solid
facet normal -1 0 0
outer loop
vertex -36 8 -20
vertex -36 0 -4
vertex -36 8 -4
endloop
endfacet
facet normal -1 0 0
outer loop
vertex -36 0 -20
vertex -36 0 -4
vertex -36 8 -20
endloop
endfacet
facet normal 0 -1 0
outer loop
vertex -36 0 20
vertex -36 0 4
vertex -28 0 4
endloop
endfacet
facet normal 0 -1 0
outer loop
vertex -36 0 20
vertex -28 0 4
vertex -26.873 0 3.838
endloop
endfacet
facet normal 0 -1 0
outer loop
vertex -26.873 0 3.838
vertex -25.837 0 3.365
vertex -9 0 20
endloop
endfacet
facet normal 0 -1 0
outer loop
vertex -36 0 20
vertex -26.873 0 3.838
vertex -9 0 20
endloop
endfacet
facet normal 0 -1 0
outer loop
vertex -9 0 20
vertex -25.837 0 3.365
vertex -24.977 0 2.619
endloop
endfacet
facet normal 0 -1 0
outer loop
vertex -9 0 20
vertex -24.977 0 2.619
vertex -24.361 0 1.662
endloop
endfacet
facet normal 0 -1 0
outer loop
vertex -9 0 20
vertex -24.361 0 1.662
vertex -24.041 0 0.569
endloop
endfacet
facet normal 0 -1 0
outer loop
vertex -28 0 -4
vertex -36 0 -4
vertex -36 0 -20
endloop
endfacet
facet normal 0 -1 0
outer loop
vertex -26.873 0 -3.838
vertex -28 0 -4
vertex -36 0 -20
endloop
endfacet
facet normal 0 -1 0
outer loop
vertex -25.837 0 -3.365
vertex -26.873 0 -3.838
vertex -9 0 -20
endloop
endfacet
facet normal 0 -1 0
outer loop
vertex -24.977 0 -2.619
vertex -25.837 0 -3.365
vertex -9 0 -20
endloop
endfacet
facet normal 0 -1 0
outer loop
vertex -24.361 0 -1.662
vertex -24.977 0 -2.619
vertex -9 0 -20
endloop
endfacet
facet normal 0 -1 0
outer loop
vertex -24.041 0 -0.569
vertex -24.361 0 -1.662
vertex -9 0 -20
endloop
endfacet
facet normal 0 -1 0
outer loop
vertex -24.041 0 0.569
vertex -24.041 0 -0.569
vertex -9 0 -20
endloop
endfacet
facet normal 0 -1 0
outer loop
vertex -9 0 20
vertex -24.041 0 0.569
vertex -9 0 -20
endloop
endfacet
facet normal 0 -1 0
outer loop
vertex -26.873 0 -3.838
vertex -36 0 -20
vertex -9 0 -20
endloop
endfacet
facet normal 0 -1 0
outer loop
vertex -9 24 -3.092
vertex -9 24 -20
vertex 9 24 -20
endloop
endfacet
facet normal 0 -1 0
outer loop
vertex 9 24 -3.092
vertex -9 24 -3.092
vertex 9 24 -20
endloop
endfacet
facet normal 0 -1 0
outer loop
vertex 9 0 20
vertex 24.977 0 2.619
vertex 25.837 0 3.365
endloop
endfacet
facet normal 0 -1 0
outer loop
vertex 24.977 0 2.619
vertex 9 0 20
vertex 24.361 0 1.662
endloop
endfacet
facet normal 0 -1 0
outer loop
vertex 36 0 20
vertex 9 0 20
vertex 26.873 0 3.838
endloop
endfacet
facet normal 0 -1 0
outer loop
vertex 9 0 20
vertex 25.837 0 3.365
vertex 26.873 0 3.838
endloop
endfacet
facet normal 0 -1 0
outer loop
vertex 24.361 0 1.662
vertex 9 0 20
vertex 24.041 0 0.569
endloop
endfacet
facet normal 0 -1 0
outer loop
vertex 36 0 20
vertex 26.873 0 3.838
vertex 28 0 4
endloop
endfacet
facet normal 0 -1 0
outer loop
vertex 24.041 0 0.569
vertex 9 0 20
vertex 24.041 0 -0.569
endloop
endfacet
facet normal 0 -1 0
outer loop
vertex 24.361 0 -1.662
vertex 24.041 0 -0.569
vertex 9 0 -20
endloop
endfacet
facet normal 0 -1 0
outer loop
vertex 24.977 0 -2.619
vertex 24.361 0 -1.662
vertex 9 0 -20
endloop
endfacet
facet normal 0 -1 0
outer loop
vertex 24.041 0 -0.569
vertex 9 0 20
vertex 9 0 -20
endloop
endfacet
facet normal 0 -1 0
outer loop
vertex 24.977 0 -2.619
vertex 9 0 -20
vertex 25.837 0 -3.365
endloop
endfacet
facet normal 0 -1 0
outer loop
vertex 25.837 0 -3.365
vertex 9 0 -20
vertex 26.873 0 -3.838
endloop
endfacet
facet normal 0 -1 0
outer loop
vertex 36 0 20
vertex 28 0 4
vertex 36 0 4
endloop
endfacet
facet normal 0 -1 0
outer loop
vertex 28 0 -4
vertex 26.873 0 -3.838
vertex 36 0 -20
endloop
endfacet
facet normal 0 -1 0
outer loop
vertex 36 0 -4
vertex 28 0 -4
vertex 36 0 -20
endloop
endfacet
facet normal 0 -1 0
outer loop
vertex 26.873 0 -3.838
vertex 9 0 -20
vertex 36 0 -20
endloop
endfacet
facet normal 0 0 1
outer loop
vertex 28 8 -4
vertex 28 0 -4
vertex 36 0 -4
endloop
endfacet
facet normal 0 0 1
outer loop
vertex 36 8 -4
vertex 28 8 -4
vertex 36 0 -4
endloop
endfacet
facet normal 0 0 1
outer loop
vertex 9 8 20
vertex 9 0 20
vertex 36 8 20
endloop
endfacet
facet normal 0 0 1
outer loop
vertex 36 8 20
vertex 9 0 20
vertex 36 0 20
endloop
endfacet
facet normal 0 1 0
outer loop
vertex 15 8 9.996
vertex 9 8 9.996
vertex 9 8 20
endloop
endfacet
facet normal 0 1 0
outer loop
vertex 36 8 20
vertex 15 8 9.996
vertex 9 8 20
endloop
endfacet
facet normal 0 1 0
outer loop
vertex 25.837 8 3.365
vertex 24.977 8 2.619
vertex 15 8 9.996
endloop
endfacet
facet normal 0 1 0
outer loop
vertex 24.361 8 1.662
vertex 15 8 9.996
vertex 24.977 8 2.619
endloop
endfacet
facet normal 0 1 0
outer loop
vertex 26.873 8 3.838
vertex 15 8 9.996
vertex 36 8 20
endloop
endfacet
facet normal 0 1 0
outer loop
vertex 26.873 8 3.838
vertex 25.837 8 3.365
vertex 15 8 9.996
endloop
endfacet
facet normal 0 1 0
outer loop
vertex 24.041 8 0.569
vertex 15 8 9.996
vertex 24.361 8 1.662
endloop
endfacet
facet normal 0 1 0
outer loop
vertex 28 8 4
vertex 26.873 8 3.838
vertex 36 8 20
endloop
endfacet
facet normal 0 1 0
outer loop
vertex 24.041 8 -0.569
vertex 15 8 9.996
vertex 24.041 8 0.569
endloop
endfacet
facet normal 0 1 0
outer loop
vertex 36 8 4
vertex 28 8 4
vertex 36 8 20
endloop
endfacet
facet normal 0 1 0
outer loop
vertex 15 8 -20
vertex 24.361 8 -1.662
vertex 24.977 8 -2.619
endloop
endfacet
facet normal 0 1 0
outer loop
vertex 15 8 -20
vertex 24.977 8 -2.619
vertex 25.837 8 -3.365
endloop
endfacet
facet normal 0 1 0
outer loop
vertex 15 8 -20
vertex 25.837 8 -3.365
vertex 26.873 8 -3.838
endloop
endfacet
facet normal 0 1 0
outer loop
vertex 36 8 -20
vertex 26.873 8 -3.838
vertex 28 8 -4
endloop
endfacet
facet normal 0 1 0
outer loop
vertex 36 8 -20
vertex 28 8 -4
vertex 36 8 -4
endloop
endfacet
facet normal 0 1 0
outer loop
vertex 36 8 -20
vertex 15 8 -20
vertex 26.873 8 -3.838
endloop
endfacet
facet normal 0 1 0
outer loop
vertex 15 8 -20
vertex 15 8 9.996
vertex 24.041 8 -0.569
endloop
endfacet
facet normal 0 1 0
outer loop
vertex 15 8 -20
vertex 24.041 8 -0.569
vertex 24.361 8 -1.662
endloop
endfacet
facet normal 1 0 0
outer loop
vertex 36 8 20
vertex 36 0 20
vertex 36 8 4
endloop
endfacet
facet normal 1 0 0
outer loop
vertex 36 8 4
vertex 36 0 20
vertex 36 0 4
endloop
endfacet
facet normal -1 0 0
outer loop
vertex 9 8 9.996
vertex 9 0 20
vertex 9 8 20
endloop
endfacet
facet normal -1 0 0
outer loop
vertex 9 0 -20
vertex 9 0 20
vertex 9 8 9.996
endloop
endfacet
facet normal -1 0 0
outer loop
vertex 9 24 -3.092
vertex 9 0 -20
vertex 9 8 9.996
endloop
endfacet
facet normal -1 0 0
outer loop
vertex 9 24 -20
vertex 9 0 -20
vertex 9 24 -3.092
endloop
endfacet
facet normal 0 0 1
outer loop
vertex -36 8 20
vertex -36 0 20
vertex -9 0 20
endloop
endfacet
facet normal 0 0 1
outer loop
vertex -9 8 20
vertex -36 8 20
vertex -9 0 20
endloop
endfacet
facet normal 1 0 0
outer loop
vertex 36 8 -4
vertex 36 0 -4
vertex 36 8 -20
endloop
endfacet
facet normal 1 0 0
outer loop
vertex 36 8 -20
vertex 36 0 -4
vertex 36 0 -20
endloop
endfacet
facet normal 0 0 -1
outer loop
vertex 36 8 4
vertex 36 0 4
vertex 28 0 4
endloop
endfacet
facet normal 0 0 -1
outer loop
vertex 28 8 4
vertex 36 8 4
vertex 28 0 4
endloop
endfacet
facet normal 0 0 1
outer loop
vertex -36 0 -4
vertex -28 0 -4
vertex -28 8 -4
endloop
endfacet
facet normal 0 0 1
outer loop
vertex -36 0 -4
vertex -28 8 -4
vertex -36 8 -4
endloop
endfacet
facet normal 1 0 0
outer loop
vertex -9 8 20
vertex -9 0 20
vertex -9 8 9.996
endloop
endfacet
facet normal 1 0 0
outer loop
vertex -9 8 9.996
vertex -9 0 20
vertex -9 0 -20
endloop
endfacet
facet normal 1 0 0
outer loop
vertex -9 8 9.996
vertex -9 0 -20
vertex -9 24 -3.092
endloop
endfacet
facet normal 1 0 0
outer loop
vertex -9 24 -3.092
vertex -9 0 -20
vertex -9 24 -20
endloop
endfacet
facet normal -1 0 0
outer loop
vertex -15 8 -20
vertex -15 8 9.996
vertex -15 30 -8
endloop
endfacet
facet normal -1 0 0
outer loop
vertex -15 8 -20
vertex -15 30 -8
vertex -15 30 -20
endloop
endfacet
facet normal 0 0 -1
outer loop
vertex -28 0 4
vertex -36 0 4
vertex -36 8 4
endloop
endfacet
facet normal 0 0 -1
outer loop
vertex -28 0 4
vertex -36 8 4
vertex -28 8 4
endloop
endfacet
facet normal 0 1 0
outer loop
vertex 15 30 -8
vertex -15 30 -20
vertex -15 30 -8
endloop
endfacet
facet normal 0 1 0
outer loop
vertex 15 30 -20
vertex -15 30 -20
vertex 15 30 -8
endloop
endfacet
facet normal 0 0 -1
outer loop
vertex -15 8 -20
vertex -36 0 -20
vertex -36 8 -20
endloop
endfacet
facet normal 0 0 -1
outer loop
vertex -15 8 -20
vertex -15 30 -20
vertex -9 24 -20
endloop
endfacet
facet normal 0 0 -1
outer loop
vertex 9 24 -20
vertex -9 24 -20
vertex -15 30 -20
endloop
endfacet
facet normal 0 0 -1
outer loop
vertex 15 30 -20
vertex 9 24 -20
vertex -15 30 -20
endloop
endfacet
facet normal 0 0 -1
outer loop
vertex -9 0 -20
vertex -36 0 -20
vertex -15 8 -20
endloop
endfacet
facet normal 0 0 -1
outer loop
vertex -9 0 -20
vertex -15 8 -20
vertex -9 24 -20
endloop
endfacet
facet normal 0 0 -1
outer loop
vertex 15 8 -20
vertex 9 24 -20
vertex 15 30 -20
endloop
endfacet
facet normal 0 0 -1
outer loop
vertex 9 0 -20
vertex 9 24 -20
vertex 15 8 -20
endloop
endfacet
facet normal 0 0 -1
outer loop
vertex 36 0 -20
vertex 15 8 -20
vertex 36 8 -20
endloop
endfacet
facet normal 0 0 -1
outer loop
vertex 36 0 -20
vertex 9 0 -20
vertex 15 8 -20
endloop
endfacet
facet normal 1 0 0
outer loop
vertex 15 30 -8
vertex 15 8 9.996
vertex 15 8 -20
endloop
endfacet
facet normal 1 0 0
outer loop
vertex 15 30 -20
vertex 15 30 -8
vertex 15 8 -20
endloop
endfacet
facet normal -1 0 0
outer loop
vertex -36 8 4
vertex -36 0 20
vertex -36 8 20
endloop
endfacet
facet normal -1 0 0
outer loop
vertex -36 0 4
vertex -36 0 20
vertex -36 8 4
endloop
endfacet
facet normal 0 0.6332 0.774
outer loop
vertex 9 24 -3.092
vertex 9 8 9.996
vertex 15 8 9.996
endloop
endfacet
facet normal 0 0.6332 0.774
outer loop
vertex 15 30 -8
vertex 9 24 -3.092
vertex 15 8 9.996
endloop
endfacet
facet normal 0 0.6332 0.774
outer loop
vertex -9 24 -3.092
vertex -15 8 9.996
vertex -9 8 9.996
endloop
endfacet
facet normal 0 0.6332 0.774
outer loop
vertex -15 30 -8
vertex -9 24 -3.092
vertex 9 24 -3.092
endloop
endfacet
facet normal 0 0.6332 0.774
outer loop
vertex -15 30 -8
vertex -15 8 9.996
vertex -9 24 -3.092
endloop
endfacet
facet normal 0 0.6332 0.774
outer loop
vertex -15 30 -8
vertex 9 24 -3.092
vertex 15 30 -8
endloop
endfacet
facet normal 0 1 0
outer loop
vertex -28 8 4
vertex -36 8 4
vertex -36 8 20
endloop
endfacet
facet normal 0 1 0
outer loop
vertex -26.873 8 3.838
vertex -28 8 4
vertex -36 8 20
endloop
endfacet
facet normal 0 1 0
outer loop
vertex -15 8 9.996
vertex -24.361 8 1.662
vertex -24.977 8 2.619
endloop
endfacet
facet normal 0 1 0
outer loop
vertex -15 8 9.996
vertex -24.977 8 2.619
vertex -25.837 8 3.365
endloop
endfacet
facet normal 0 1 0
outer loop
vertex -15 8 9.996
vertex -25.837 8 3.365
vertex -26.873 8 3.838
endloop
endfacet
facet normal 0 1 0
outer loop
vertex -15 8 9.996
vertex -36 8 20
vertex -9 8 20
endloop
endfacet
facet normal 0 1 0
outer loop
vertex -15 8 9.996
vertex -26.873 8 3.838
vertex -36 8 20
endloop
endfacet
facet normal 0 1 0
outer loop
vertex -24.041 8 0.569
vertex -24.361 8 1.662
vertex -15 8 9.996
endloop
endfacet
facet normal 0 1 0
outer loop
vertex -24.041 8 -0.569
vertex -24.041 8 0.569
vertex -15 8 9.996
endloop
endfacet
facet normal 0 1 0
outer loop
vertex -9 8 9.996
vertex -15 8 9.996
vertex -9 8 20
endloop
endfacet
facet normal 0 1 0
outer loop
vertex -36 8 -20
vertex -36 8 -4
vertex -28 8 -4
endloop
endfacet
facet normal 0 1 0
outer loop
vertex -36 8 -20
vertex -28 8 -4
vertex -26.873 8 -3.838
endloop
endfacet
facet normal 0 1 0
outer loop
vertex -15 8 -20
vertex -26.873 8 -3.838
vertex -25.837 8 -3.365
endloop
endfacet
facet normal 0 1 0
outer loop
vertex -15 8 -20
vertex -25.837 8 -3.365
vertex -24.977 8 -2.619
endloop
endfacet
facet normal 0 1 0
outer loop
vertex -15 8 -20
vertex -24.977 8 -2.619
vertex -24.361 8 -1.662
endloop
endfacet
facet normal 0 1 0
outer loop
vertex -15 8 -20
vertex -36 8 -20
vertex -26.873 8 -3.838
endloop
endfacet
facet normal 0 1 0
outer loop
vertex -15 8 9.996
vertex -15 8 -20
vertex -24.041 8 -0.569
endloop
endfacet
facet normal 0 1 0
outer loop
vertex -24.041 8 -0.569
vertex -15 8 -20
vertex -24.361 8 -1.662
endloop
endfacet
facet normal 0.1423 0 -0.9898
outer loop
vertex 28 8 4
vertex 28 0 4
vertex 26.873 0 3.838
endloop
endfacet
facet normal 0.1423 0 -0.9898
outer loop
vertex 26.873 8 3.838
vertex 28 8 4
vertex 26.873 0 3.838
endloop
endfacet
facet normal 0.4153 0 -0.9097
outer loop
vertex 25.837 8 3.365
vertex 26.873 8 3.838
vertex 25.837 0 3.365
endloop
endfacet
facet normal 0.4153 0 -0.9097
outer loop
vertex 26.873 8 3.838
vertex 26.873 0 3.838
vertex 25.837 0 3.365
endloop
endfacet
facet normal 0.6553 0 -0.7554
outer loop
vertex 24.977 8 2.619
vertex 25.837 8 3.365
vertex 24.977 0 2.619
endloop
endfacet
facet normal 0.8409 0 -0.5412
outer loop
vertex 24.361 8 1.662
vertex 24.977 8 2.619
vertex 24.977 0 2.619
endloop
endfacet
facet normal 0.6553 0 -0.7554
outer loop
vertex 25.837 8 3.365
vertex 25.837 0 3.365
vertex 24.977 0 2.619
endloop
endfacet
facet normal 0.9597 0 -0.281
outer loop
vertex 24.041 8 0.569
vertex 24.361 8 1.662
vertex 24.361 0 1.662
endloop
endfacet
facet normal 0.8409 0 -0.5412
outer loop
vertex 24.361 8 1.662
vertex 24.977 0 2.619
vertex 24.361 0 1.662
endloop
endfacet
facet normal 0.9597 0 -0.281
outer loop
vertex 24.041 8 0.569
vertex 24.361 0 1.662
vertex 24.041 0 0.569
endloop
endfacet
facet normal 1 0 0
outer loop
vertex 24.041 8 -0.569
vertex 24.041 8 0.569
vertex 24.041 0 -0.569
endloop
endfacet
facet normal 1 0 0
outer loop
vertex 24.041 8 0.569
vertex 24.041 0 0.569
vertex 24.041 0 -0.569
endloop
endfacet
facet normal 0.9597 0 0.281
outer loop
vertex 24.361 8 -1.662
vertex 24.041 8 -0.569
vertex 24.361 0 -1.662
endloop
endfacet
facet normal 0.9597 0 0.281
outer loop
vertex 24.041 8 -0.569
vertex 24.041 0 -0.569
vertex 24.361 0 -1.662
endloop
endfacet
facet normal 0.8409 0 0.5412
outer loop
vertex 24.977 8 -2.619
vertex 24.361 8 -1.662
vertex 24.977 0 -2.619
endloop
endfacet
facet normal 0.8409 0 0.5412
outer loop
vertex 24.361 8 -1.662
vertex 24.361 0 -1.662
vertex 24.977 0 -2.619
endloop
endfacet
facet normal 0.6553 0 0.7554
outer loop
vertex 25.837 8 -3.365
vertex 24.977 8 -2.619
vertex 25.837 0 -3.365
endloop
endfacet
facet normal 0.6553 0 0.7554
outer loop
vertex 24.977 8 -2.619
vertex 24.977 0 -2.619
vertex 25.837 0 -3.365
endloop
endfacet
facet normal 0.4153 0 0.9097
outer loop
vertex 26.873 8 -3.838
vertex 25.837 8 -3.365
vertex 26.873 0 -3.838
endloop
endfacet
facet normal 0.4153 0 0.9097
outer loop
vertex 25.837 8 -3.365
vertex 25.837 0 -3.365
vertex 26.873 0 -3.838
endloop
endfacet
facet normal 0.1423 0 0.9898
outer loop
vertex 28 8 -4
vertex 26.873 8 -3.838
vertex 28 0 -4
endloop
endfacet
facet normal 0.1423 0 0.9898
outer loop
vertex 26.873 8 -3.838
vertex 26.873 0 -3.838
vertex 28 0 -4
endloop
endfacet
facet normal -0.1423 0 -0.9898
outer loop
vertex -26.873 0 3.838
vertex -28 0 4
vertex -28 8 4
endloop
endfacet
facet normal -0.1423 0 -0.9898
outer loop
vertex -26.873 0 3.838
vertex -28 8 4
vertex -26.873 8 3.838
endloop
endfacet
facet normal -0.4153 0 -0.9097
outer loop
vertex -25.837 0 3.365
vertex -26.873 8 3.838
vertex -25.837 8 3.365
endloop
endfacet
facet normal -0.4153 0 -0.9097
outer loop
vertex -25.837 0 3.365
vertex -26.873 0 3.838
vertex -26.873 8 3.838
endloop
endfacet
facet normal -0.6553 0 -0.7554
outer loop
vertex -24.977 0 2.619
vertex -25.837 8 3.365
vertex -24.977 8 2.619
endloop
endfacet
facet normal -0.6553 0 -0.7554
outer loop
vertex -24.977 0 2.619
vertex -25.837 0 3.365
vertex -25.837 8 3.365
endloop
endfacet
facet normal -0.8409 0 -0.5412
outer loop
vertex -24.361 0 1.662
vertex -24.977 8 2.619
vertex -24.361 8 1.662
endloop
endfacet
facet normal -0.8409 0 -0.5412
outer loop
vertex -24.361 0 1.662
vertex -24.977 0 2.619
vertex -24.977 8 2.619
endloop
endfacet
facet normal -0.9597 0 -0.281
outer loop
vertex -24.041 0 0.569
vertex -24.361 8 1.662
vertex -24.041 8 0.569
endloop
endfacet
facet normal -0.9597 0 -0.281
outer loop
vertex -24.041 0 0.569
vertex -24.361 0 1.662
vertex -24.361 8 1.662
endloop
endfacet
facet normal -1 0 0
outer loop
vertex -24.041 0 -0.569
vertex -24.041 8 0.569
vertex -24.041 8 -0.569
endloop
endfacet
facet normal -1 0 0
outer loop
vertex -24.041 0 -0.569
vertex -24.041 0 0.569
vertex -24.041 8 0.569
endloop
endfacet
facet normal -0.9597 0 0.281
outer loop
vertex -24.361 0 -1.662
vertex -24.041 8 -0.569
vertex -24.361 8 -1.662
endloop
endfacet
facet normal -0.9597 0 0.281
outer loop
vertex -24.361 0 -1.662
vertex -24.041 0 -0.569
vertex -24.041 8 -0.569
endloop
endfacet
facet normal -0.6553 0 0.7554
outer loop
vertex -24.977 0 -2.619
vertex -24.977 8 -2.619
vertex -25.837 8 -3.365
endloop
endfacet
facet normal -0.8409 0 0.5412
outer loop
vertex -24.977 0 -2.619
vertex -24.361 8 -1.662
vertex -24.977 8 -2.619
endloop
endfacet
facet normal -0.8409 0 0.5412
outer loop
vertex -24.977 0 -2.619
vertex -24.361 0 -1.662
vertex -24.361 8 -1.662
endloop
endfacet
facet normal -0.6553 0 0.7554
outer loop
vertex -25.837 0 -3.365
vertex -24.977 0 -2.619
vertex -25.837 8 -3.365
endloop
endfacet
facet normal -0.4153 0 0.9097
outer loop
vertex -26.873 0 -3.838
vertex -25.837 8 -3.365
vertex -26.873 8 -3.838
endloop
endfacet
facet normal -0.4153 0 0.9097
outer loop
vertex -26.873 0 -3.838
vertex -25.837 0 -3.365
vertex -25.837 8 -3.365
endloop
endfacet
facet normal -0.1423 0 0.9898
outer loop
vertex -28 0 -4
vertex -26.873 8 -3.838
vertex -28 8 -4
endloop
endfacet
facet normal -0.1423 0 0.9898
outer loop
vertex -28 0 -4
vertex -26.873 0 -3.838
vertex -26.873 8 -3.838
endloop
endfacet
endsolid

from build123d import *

# Parameters (mm, degrees)
SKETCH_1_W               = 72
SKETCH_1_H               = 40
EXTRUDE_1_DEPTH          = 8
SKETCH_2_W               = 30
SKETCH_2_H               = 40
EXTRUDE_2_DEPTH          = 30
CUT_EXTRUDE_1_DEPTH      = 30
CUT_EXTRUDE_1_DEPTH_BACK = 30
CUT_EXTRUDE_2_DEPTH      = 30
CUT_EXTRUDE_2_DEPTH_BACK = 30
SKETCH_4_W               = 18
SKETCH_4_H               = 24
CUT_EXTRUDE_4_DEPTH      = 30
CUT_EXTRUDE_4_DEPTH_BACK = 30


with BuildPart() as part:
    # 草图1 → 凸台-拉伸1 (new body)
    with BuildSketch(Plane(origin=(0, 0, 0), x_dir=(1, 0, 0), z_dir=(0, 1, 0))):
        Rectangle(SKETCH_1_W, SKETCH_1_H)
    extrude(amount=EXTRUDE_1_DEPTH)

    # 草图2 → 凸台-拉伸2 (add)
    with BuildSketch(Plane(origin=(0, 0, 0), x_dir=(1, 0, 0), z_dir=(0, 1, 0))):
        Rectangle(SKETCH_2_W, SKETCH_2_H)
    extrude(amount=EXTRUDE_2_DEPTH)

    # 草图3 → 切除-拉伸1 (cut, two sides: drawn at the far end of the back side and taken through both)
    with BuildSketch(Plane(origin=(0, 0, 0), x_dir=(0, 0, -1), z_dir=(1, 0, 0)).offset(-CUT_EXTRUDE_1_DEPTH_BACK)):
        Polygon((-9.996476923, 8), (8, 30), (-20, 30), (-20, 8), align=None)
    extrude(amount=CUT_EXTRUDE_1_DEPTH + CUT_EXTRUDE_1_DEPTH_BACK, mode=Mode.SUBTRACT)

    # 草图4 → 切除-拉伸2 (cut, two sides: drawn at the far end of the back side and taken through both)
    with BuildSketch(Plane.XY.offset(-CUT_EXTRUDE_2_DEPTH_BACK)):
        with Locations((0, 12)):
            Rectangle(SKETCH_4_W, SKETCH_4_H)
    extrude(amount=CUT_EXTRUDE_2_DEPTH + CUT_EXTRUDE_2_DEPTH_BACK, mode=Mode.SUBTRACT)

    # 草图7 → 切除-拉伸4 (cut, two sides: drawn at the far end of the back side and taken through both)
    with BuildSketch(Plane(origin=(0, 0, 0), x_dir=(1, 0, 0), z_dir=(0, 1, 0)).offset(-CUT_EXTRUDE_4_DEPTH_BACK)):
        with BuildLine():
            Line((-28, 4), (-36, 4))
            Line((-36, 4), (-36, -4))
            Line((-36, -4), (-28, -4))
            ThreePointArc((-28, -4), (-24, 0), (-28, 4))
        make_face()
        with BuildLine():
            Line((28, 4), (36, 4))
            Line((36, 4), (36, -4))
            Line((36, -4), (28, -4))
            ThreePointArc((28, -4), (24, 0), (28, 4))
        make_face()
    extrude(amount=CUT_EXTRUDE_4_DEPTH + CUT_EXTRUDE_4_DEPTH_BACK, mode=Mode.SUBTRACT)


solid = part.part
